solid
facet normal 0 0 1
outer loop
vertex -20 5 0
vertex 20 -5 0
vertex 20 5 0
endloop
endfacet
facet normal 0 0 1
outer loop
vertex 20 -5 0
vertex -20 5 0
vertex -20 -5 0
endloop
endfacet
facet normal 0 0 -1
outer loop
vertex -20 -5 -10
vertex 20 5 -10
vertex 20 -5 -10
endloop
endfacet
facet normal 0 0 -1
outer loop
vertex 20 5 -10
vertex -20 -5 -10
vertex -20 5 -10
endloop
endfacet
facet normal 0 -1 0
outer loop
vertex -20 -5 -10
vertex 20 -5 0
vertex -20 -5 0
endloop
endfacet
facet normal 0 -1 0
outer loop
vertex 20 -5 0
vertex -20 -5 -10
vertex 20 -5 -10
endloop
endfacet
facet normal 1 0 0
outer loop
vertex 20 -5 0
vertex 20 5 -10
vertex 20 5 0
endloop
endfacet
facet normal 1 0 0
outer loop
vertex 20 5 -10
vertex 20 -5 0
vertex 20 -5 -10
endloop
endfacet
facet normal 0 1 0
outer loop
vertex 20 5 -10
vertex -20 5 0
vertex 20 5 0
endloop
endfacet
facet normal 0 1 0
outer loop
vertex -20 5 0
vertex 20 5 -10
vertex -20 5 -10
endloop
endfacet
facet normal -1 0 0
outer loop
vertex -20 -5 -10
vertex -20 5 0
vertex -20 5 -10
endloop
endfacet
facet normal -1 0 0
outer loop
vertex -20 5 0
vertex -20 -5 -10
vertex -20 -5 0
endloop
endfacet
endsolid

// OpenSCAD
// file: consts.scad
/*
DESCRIPTION
  Constants for SCUSU CAD model.

AUTHORS
  Saxon A. Nelson-Milton <saxon@ausocean.org>

LICENSE
  Copyright (C) 2020 the Australian Ocean Lab (AusOcean)

  It is free software: you can redistribute it and/or modify them
  under the terms of the GNU General Public License as published by the
  Free Software Foundation, either version 3 of the License, or (at your
  option) any later version.

  It is distributed in the hope that it will be useful, but WITHOUT
  ANY WARRANTY; without even the implied warranty of MERCHANTABILITY or
  FITNESS FOR A PARTICULAR PURPOSE. See the GNU General Public License
  for more details.

  You should have received a copy of the GNU General Public License
  in gpl.txt.  If not, see http://www.gnu.org/licenses.
*/

alpha = 0.5;

// Misc.
noOfFaces = 500;

$fn = noOfFaces;

// Pipe properties.
pipeLength              = 600;
pipeOuterDiameter       = 160;
pipeInternalDiameter    = 155;

// Access coupling properties.
couplingInnerDiameter = 160;
couplingOuterDiameter = couplingInnerDiameter+10;
couplingLength        = 160;

// Threaded cap properties.
capInnerDiameter    = couplingOuterDiameter;
capOuterDiameter    = 185;
capLength           = 35;

// Battery properties.
battLength = 151;
battWidth = 98;
battHeight = 93;

// Wood properties.
woodColor = [1,178/255,102/255];
woodThickness = 10;

// Battery holder end properties.
holderEndWidth = woodThickness;
holderEndDiameter = pipeInternalDiameter;

// Calculate battery displacement from center.
battDisplacement = sqrt(pow(pipeInternalDiameter/2,2)-pow(battWidth/2,2))-(battHeight/2);

// Reed switch properties.
reedSwitchLen = 40;
reedSwitchWidth = 10;
reedSwitchHeight = 10;
reedSwitchDisplacement = 30;

// Spacer properties.
spacerLegHeight = 120;
spacerLegLength = 80;
// main file
/*
DESCRIPTION
  Crude model of a reed switch.

AUTHORS
  Saxon A. Nelson-Milton <saxon@ausocean.org>

LICENSE
  Copyright (C) 2020 the Australian Ocean Lab (AusOcean)

  It is free software: you can redistribute it and/or modify them
  under the terms of the GNU General Public License as published by the
  Free Software Foundation, either version 3 of the License, or (at your
  option) any later version.

  It is distributed in the hope that it will be useful, but WITHOUT
  ANY WARRANTY; without even the implied warranty of MERCHANTABILITY or
  FITNESS FOR A PARTICULAR PURPOSE. See the GNU General Public License
  for more details.

  You should have received a copy of the GNU General Public License
  in gpl.txt.  If not, see http://www.gnu.org/licenses.
*/

include <consts.scad>

reedSwitch();

module reedSwitch(){
    translate([0,0,-reedSwitchHeight/2])
    color("grey")
    cube([reedSwitchLen,reedSwitchWidth,reedSwitchHeight],center=true);
}
